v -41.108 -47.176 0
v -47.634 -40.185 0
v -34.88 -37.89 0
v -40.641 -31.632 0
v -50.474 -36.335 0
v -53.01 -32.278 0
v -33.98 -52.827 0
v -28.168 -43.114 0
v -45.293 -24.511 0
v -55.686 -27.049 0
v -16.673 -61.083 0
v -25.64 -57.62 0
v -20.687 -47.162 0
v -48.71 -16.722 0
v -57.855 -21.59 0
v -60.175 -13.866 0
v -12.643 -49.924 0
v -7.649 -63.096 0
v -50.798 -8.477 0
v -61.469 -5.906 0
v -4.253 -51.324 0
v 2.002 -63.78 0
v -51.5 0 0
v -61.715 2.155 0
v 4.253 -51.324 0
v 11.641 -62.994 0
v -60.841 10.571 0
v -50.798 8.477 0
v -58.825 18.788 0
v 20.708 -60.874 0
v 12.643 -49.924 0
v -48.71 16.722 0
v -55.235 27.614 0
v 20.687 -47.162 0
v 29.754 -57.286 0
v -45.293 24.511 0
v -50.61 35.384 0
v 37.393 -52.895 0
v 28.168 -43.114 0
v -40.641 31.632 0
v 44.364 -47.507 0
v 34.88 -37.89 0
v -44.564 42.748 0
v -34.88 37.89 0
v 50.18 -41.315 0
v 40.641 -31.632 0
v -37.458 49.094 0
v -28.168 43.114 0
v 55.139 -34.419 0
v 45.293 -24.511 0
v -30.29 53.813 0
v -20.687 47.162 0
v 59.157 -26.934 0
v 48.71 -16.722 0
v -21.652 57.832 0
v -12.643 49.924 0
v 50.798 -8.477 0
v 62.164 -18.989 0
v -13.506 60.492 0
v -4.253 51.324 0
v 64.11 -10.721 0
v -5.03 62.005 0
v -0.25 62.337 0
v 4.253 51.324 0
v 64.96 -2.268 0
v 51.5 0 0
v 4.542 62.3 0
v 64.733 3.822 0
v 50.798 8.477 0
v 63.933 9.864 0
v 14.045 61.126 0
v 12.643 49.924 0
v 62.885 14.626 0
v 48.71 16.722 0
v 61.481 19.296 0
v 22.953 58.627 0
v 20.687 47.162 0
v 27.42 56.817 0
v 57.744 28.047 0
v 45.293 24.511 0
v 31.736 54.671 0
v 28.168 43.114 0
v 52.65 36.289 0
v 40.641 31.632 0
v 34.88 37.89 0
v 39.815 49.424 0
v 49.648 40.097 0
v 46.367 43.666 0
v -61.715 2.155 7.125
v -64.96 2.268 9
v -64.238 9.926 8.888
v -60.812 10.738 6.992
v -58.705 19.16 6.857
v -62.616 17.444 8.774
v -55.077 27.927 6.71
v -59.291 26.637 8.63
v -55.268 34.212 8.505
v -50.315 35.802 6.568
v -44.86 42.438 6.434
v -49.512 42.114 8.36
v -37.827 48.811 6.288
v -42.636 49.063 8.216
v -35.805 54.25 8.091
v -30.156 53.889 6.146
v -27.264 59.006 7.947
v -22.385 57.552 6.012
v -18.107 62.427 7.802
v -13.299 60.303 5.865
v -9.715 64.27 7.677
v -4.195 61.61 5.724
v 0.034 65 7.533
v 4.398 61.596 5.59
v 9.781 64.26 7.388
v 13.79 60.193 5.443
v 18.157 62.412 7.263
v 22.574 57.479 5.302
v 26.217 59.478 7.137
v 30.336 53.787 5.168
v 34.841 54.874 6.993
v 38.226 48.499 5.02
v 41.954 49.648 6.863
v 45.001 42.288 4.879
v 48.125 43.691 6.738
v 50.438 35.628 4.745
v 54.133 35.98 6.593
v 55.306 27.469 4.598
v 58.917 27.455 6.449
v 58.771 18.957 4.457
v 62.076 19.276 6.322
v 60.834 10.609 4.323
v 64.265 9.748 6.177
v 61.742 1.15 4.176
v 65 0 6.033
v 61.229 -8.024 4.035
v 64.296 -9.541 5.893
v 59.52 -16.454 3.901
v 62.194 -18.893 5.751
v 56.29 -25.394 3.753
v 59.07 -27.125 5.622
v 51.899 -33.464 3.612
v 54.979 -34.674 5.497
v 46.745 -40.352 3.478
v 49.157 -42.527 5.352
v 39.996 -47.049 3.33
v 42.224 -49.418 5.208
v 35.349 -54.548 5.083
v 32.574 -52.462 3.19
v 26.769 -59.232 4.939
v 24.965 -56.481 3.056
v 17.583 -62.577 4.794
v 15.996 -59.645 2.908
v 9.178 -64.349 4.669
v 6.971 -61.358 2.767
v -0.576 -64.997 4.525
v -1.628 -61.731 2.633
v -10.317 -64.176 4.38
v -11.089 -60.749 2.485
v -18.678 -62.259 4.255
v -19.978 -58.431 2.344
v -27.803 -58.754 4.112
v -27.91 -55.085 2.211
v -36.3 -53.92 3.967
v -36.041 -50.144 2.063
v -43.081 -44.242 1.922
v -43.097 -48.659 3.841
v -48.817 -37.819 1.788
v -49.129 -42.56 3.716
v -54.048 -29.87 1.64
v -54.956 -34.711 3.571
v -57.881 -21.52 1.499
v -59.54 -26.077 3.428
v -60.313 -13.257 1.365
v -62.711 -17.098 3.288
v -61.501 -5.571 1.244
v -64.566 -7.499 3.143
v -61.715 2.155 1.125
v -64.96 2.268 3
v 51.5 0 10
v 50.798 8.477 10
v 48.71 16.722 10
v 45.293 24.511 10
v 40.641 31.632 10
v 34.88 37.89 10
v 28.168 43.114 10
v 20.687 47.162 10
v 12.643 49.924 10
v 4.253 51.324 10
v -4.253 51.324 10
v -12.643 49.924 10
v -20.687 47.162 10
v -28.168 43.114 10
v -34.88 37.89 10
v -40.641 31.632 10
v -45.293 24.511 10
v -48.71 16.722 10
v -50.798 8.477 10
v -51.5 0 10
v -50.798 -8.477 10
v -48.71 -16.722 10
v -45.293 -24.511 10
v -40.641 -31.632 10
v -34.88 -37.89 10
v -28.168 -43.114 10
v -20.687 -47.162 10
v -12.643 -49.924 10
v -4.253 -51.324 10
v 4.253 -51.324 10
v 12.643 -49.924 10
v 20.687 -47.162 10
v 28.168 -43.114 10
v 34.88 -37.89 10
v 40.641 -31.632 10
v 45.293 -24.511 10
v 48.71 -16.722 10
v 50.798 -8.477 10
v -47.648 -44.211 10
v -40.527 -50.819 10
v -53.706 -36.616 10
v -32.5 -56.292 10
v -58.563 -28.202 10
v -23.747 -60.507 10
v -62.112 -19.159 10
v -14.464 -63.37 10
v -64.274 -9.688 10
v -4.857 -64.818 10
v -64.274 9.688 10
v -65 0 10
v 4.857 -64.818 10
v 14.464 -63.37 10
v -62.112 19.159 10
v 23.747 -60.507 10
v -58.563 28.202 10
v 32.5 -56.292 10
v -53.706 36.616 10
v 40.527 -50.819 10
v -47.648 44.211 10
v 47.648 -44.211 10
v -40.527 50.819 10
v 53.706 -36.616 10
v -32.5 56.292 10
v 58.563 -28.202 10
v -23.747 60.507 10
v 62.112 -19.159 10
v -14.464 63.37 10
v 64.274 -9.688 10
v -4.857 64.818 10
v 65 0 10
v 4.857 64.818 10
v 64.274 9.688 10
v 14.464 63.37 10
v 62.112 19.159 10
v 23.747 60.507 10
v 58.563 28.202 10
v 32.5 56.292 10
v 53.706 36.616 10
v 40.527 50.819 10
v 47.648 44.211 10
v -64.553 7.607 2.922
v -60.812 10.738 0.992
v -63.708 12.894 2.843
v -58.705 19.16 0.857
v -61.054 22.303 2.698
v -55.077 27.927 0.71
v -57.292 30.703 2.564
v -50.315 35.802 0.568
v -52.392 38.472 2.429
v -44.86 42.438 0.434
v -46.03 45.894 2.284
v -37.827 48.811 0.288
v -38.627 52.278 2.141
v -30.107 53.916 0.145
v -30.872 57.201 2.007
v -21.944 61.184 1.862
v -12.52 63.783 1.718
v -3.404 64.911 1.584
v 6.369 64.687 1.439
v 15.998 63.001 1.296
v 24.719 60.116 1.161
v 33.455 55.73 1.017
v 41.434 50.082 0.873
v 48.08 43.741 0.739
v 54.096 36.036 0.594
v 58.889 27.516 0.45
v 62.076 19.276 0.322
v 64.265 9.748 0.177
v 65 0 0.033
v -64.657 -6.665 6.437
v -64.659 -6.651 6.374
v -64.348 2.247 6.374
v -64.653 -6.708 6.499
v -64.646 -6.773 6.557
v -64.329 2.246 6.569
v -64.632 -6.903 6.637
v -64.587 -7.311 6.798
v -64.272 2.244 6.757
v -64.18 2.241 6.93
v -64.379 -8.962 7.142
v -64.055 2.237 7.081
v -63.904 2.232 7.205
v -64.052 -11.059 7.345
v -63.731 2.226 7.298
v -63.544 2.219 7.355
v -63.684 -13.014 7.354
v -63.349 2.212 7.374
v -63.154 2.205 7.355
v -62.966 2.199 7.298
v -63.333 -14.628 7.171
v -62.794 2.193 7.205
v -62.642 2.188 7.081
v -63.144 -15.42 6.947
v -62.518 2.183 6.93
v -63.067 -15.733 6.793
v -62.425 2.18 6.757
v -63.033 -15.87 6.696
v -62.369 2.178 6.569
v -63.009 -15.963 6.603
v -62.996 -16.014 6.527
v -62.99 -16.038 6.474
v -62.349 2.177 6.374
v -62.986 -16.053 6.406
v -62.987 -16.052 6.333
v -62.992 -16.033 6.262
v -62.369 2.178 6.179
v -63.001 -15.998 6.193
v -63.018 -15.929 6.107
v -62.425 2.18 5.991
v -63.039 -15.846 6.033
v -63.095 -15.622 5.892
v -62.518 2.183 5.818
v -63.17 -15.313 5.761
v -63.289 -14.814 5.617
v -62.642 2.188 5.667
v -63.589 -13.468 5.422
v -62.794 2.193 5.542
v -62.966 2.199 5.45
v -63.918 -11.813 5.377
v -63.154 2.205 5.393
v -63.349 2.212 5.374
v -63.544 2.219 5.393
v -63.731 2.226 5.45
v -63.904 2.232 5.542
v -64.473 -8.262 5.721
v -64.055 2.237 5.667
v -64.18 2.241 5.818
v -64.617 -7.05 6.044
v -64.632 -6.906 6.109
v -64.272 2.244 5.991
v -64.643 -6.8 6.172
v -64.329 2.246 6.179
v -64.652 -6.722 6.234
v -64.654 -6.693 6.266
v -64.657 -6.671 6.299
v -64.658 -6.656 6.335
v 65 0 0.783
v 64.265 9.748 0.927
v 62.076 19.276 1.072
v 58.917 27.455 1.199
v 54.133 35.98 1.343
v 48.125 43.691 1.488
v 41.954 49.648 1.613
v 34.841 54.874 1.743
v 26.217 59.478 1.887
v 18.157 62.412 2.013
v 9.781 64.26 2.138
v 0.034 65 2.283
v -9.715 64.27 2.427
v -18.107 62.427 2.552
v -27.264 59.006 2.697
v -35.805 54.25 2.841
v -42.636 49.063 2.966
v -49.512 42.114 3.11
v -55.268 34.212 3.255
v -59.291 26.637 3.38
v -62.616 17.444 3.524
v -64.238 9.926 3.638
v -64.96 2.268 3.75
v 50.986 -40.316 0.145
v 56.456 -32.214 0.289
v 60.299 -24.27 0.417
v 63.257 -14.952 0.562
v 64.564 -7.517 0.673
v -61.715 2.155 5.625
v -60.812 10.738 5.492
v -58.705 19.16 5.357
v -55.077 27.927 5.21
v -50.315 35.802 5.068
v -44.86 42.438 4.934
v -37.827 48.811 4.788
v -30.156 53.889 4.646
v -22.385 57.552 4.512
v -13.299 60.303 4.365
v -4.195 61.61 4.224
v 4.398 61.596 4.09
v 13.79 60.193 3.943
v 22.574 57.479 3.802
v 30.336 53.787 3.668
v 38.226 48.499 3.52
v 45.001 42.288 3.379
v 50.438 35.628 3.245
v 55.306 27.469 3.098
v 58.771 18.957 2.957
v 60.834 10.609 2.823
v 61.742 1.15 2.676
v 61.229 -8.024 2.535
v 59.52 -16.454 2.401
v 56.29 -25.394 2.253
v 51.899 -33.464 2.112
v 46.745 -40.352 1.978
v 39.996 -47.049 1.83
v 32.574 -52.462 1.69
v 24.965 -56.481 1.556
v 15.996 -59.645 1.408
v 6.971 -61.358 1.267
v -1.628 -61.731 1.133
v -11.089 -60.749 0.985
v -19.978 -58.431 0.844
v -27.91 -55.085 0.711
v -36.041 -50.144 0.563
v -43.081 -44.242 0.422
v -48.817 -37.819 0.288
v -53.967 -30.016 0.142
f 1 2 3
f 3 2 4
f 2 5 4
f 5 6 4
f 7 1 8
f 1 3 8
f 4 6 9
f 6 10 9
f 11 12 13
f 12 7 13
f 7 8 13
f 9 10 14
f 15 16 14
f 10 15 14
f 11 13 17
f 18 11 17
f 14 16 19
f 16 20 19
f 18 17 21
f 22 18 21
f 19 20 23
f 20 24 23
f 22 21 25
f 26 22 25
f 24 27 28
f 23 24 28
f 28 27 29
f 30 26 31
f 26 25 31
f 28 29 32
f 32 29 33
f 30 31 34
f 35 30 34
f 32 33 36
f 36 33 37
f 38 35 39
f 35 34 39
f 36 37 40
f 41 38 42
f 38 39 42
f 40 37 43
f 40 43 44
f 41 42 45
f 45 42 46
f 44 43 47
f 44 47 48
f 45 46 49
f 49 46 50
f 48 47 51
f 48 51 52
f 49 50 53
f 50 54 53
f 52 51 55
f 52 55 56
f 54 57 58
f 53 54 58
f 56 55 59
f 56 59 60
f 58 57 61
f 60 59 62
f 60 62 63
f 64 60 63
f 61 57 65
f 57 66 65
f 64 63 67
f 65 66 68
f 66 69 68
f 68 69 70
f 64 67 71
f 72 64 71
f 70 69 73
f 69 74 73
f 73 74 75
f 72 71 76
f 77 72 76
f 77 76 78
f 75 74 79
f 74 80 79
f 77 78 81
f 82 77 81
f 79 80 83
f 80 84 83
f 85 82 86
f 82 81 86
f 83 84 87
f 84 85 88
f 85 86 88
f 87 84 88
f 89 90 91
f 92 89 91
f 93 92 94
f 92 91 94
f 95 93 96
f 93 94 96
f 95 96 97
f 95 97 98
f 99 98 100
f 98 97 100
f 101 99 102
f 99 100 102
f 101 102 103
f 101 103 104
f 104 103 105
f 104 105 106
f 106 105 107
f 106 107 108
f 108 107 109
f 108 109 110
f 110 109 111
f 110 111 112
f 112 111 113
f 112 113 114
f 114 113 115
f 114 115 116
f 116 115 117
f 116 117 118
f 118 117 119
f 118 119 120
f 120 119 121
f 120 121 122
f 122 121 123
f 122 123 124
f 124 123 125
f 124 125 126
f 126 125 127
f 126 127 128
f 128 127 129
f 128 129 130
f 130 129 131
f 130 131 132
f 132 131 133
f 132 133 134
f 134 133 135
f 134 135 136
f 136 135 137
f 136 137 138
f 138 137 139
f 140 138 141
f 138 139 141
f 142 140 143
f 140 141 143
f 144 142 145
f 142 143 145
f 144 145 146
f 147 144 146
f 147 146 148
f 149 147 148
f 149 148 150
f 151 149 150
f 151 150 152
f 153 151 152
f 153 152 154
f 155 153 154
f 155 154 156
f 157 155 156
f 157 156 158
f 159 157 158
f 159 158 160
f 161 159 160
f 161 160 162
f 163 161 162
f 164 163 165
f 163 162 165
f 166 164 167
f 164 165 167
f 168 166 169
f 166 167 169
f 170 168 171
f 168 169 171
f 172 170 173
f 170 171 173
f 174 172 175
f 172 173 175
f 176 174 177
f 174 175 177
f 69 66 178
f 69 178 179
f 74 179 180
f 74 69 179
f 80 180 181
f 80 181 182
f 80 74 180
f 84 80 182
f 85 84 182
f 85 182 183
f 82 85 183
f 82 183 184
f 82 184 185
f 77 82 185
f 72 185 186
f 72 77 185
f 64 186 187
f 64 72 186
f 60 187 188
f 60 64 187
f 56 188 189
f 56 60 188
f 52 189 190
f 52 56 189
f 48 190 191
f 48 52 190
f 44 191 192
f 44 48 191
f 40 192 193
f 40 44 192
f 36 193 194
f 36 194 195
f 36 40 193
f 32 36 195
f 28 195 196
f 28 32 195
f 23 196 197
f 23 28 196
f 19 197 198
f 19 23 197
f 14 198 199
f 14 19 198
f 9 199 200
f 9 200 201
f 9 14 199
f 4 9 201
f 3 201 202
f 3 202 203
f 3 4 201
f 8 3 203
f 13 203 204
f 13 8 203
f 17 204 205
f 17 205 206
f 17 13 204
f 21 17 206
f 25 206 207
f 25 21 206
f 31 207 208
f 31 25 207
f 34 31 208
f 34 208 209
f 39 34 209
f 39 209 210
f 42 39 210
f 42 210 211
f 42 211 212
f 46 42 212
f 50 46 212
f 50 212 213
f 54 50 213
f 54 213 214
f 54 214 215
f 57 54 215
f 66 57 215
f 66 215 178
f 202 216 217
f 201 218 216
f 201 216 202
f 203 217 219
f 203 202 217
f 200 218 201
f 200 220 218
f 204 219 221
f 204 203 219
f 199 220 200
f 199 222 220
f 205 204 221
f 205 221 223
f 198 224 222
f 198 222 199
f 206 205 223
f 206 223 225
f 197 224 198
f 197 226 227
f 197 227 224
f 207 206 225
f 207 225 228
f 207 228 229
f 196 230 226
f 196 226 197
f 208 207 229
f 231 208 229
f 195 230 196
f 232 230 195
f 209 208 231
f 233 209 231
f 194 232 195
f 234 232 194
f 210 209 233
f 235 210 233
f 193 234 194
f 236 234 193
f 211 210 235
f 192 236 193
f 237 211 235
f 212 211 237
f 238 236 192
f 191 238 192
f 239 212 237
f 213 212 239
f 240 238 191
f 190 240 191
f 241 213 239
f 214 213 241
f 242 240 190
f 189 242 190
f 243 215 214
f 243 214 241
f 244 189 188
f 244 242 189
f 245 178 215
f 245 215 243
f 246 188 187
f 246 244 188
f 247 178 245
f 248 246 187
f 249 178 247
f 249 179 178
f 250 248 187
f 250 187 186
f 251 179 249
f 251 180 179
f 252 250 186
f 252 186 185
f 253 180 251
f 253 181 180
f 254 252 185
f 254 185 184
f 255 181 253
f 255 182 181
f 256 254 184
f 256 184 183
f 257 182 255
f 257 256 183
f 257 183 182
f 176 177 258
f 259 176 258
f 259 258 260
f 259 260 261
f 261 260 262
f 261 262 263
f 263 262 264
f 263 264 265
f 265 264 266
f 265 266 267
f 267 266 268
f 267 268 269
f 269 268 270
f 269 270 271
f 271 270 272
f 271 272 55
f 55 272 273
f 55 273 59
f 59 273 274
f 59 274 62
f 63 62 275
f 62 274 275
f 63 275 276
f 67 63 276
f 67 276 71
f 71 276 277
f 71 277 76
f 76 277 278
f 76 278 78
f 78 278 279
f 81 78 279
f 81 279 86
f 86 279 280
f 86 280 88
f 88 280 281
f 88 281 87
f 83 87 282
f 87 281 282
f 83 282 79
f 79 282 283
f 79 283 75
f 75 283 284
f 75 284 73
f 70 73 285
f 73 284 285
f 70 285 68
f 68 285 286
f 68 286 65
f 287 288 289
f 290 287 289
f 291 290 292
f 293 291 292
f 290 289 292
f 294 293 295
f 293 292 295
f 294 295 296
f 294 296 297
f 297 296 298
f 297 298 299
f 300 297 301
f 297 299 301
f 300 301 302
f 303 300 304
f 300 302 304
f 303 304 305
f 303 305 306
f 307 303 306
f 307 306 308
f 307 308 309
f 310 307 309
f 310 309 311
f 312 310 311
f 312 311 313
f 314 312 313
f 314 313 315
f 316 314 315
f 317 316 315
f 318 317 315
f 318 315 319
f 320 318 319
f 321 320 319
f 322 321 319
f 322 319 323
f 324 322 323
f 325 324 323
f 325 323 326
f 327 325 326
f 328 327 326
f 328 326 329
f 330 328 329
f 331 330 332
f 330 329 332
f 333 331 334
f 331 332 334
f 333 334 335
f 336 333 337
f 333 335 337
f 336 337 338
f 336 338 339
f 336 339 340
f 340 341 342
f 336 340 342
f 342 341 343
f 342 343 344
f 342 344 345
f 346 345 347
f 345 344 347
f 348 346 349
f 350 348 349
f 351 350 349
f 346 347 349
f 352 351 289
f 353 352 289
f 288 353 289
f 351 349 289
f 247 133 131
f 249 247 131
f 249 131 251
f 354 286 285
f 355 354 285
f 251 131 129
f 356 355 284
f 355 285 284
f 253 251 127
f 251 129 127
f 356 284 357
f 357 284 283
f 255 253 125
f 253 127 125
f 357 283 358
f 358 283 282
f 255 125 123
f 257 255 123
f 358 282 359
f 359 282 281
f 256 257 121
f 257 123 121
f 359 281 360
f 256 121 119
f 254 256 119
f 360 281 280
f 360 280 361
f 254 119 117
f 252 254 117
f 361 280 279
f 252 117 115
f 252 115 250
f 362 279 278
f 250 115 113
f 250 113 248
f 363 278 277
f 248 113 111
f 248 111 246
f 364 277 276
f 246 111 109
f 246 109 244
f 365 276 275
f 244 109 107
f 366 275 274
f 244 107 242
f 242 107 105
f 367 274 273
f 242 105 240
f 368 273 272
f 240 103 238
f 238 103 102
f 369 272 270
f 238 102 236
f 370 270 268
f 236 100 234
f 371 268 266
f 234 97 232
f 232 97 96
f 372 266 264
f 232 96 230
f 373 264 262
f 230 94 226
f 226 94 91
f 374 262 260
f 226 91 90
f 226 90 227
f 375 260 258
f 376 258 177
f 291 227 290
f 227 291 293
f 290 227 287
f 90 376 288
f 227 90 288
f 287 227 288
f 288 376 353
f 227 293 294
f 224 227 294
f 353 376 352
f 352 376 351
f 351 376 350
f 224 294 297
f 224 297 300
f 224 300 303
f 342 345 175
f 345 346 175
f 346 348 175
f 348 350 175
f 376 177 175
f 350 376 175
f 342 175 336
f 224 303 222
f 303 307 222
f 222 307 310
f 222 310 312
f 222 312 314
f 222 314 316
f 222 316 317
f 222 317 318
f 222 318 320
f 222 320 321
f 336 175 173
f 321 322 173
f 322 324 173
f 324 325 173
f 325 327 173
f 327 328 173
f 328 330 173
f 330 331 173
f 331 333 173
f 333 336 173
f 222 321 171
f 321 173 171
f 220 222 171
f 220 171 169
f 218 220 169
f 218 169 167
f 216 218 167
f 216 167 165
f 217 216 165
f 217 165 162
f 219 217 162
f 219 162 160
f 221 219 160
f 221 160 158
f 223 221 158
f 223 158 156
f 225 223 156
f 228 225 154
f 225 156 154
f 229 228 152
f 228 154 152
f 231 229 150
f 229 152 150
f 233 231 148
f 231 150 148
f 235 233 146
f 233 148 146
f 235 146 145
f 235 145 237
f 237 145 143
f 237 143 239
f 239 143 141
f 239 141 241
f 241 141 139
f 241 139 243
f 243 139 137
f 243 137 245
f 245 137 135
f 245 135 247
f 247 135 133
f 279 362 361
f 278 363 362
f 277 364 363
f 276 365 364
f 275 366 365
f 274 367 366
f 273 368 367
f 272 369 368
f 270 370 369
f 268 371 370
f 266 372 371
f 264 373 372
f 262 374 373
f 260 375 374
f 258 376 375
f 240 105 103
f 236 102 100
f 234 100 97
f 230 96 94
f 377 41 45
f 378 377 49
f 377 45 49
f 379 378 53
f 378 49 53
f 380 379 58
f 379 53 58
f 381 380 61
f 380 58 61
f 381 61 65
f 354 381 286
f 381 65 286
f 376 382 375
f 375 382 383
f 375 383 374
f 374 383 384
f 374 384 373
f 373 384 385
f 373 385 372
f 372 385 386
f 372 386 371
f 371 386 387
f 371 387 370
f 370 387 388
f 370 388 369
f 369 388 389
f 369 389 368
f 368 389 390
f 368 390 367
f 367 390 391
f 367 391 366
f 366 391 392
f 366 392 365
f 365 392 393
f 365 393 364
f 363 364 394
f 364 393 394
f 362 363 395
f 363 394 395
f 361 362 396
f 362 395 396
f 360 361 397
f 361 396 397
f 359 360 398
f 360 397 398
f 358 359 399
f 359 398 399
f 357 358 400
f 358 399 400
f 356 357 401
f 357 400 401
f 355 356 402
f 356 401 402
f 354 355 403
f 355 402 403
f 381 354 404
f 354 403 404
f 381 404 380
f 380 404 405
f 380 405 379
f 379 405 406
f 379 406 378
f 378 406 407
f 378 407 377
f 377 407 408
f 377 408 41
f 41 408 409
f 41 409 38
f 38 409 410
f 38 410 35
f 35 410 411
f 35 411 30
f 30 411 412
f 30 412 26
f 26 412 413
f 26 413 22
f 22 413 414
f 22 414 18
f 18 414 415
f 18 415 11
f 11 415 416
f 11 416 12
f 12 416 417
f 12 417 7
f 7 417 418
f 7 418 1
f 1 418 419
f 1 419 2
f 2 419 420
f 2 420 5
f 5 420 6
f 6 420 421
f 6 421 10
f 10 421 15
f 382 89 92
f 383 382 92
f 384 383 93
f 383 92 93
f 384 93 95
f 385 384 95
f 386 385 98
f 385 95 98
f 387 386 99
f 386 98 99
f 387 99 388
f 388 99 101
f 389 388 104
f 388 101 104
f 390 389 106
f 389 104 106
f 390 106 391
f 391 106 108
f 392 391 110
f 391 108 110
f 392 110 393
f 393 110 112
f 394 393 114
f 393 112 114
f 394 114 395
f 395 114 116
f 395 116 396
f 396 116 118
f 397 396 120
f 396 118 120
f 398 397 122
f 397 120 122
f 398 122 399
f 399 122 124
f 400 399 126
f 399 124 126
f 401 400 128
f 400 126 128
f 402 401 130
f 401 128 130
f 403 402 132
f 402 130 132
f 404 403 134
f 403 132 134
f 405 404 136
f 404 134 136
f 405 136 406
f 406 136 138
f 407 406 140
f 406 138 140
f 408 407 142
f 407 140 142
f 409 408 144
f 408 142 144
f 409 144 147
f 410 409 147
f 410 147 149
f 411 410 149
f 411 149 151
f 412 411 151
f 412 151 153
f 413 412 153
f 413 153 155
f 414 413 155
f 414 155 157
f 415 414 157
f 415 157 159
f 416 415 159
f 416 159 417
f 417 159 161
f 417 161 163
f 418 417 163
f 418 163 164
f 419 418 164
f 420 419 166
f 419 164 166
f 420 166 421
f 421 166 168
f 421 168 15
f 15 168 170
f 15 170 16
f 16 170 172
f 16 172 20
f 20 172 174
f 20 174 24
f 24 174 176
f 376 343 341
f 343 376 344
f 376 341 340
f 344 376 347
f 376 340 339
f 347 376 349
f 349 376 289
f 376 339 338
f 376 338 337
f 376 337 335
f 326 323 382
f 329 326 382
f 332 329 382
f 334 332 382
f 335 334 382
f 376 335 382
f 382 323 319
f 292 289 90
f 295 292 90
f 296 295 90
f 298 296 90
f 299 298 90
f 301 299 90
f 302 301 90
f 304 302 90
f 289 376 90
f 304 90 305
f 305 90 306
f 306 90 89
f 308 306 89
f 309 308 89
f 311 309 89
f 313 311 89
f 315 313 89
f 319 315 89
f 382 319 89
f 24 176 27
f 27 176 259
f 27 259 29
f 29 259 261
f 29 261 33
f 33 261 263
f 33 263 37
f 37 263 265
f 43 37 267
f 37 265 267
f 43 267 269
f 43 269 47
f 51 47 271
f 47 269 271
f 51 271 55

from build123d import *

# Parameters (mm, degrees)
SKETCH1_R           = 65
SKETCH1_R_2         = 51.5
BOSS_EXTRUDE1_DEPTH = 10
THREAD1_PITCH       = 6
SKETCH10_R          = 1
CUT_EXTRUDE1_DEPTH  = 21


with BuildPart() as part:
    # Sketch1 → Boss-Extrude1 (new body)
    with BuildSketch(Plane.XY):
        Circle(SKETCH1_R)
        Circle(SKETCH1_R_2, mode=Mode.SUBTRACT)
    extrude(amount=BOSS_EXTRUDE1_DEPTH)

    # Thread1: the profile of Thread Profile1 profile screwed along a right-hand helix of 1.5 turns, 14 arcs to a turn; built about Z, then put on its axis
    thread1_z = Axis((0, 0, 0), (0, 0, 1))
    thread1_corners = [(65.0003, -1.9e-08, -0.000173205), (65.0003, -1.9e-08, 5.250173189), (61.75240475, -1.8e-08, 3.374999992), (61.75240475, -1.8e-08, 1.874999992)]
    with BuildLine(mode=Mode.PRIVATE) as thread1_profile:
        Line(thread1_corners[0], thread1_corners[1])
        Line(thread1_corners[1], thread1_corners[2])
        Line(thread1_corners[2], thread1_corners[3])
        Line(thread1_corners[3], thread1_corners[0])
    thread1_cap = Face(thread1_profile.wire())
    thread1_turn_angles = [0, 12.857142857, 25.714285714, 38.571428571, 51.428571429, 64.285714286, 77.142857143, 90, 102.857142857, 115.714285714, 128.571428571, 141.428571429, 154.285714286, 167.142857143, 180, 192.857142857, 205.714285714, 218.571428571, 231.428571429, 244.285714286, 257.142857143, 270, 282.857142857, 295.714285714, 308.571428571, 321.428571429, 334.285714286, 347.142857143, 360]
    thread1_turn_weights = [1, 0.9749279121818236, 1, 0.9749279121818236, 1, 0.9749279121818236, 1, 0.9749279121818236, 1, 0.9749279121818236, 1, 0.9749279121818236, 1, 0.9749279121818236, 1, 0.9749279121818236, 1, 0.9749279121818236, 1, 0.9749279121818236, 1, 0.9749279121818236, 1, 0.9749279121818237, 1, 0.9749279121818236, 1, 0.9749279121818236, 1]
    thread1_turn_rails = [Edge.make_bspline([Vector(p[0], p[1], 0).rotate(thread1_z, thread1_turn_angles[k]) / thread1_turn_weights[k] + Vector(0, 0, p[2] + THREAD1_PITCH * thread1_turn_angles[k] / 360) for k in range(29)], [0, 0, 0, 1, 1, 2, 2, 3, 3, 4, 4, 5, 5, 6, 6, 7, 7, 8, 8, 9, 9, 10, 10, 11, 11, 12, 12, 13, 13, 14, 14, 14], 2, thread1_turn_weights) for p in thread1_corners]
    thread1_turn_sides = [Face.make_surface_from_curves(thread1_turn_rails[p[0]], thread1_turn_rails[p[1]]) for p in [(0, 1), (1, 2), (2, 3), (3, 0)]]
    thread1_last_angles = [360, 372.857142857, 385.714285714, 398.571428571, 411.428571429, 424.285714286, 437.142857143, 450, 462.857142857, 475.714285714, 488.571428571, 501.428571429, 514.285714286, 527.142857143, 540]
    thread1_last_weights = [1, 0.9749279121818236, 1, 0.9749279121818236, 1, 0.9749279121818237, 1, 0.9749279121818235, 1, 0.9749279121818237, 1, 0.9749279121818237, 1, 0.9749279121818235, 1]
    thread1_last_rails = [Edge.make_bspline([Vector(p[0], p[1], 0).rotate(thread1_z, thread1_last_angles[k]) / thread1_last_weights[k] + Vector(0, 0, p[2] + THREAD1_PITCH * thread1_last_angles[k] / 360) for k in range(15)], [0, 0, 0, 1, 1, 2, 2, 3, 3, 4, 4, 5, 5, 6, 6, 7, 7, 7], 2, thread1_last_weights) for p in thread1_corners]
    thread1_last_sides = [Face.make_surface_from_curves(thread1_last_rails[p[0]], thread1_last_rails[p[1]]) for p in [(0, 1), (1, 2), (2, 3), (3, 0)]]
    thread1 = Plane(origin=(0, 0, 9), x_dir=(-0.999390827, 0.034899497, 0), z_dir=(0, 0, -1)) * Solid(Shell([*thread1_turn_sides, *thread1_last_sides, thread1_cap, thread1_cap.rotate(thread1_z, 540).moved(Location((0, 0, THREAD1_PITCH * 540 / 360)))]))
    add(thread1, mode=Mode.SUBTRACT)

    # Sketch10 → Cut-Extrude1 (cut)
    with BuildSketch(Plane(origin=(0, 0, 0), x_dir=(0.9993908270190958, -0.03489949670250096, 0), z_dir=(0.03489949670250096, 0.9993908270190958, 0))):
        with Locations(Location((-63.387356221, -6.373965218, 0), (0, 0, 180))):
            Circle(SKETCH10_R)
    extrude(amount=-CUT_EXTRUDE1_DEPTH, mode=Mode.SUBTRACT)


solid = part.part
